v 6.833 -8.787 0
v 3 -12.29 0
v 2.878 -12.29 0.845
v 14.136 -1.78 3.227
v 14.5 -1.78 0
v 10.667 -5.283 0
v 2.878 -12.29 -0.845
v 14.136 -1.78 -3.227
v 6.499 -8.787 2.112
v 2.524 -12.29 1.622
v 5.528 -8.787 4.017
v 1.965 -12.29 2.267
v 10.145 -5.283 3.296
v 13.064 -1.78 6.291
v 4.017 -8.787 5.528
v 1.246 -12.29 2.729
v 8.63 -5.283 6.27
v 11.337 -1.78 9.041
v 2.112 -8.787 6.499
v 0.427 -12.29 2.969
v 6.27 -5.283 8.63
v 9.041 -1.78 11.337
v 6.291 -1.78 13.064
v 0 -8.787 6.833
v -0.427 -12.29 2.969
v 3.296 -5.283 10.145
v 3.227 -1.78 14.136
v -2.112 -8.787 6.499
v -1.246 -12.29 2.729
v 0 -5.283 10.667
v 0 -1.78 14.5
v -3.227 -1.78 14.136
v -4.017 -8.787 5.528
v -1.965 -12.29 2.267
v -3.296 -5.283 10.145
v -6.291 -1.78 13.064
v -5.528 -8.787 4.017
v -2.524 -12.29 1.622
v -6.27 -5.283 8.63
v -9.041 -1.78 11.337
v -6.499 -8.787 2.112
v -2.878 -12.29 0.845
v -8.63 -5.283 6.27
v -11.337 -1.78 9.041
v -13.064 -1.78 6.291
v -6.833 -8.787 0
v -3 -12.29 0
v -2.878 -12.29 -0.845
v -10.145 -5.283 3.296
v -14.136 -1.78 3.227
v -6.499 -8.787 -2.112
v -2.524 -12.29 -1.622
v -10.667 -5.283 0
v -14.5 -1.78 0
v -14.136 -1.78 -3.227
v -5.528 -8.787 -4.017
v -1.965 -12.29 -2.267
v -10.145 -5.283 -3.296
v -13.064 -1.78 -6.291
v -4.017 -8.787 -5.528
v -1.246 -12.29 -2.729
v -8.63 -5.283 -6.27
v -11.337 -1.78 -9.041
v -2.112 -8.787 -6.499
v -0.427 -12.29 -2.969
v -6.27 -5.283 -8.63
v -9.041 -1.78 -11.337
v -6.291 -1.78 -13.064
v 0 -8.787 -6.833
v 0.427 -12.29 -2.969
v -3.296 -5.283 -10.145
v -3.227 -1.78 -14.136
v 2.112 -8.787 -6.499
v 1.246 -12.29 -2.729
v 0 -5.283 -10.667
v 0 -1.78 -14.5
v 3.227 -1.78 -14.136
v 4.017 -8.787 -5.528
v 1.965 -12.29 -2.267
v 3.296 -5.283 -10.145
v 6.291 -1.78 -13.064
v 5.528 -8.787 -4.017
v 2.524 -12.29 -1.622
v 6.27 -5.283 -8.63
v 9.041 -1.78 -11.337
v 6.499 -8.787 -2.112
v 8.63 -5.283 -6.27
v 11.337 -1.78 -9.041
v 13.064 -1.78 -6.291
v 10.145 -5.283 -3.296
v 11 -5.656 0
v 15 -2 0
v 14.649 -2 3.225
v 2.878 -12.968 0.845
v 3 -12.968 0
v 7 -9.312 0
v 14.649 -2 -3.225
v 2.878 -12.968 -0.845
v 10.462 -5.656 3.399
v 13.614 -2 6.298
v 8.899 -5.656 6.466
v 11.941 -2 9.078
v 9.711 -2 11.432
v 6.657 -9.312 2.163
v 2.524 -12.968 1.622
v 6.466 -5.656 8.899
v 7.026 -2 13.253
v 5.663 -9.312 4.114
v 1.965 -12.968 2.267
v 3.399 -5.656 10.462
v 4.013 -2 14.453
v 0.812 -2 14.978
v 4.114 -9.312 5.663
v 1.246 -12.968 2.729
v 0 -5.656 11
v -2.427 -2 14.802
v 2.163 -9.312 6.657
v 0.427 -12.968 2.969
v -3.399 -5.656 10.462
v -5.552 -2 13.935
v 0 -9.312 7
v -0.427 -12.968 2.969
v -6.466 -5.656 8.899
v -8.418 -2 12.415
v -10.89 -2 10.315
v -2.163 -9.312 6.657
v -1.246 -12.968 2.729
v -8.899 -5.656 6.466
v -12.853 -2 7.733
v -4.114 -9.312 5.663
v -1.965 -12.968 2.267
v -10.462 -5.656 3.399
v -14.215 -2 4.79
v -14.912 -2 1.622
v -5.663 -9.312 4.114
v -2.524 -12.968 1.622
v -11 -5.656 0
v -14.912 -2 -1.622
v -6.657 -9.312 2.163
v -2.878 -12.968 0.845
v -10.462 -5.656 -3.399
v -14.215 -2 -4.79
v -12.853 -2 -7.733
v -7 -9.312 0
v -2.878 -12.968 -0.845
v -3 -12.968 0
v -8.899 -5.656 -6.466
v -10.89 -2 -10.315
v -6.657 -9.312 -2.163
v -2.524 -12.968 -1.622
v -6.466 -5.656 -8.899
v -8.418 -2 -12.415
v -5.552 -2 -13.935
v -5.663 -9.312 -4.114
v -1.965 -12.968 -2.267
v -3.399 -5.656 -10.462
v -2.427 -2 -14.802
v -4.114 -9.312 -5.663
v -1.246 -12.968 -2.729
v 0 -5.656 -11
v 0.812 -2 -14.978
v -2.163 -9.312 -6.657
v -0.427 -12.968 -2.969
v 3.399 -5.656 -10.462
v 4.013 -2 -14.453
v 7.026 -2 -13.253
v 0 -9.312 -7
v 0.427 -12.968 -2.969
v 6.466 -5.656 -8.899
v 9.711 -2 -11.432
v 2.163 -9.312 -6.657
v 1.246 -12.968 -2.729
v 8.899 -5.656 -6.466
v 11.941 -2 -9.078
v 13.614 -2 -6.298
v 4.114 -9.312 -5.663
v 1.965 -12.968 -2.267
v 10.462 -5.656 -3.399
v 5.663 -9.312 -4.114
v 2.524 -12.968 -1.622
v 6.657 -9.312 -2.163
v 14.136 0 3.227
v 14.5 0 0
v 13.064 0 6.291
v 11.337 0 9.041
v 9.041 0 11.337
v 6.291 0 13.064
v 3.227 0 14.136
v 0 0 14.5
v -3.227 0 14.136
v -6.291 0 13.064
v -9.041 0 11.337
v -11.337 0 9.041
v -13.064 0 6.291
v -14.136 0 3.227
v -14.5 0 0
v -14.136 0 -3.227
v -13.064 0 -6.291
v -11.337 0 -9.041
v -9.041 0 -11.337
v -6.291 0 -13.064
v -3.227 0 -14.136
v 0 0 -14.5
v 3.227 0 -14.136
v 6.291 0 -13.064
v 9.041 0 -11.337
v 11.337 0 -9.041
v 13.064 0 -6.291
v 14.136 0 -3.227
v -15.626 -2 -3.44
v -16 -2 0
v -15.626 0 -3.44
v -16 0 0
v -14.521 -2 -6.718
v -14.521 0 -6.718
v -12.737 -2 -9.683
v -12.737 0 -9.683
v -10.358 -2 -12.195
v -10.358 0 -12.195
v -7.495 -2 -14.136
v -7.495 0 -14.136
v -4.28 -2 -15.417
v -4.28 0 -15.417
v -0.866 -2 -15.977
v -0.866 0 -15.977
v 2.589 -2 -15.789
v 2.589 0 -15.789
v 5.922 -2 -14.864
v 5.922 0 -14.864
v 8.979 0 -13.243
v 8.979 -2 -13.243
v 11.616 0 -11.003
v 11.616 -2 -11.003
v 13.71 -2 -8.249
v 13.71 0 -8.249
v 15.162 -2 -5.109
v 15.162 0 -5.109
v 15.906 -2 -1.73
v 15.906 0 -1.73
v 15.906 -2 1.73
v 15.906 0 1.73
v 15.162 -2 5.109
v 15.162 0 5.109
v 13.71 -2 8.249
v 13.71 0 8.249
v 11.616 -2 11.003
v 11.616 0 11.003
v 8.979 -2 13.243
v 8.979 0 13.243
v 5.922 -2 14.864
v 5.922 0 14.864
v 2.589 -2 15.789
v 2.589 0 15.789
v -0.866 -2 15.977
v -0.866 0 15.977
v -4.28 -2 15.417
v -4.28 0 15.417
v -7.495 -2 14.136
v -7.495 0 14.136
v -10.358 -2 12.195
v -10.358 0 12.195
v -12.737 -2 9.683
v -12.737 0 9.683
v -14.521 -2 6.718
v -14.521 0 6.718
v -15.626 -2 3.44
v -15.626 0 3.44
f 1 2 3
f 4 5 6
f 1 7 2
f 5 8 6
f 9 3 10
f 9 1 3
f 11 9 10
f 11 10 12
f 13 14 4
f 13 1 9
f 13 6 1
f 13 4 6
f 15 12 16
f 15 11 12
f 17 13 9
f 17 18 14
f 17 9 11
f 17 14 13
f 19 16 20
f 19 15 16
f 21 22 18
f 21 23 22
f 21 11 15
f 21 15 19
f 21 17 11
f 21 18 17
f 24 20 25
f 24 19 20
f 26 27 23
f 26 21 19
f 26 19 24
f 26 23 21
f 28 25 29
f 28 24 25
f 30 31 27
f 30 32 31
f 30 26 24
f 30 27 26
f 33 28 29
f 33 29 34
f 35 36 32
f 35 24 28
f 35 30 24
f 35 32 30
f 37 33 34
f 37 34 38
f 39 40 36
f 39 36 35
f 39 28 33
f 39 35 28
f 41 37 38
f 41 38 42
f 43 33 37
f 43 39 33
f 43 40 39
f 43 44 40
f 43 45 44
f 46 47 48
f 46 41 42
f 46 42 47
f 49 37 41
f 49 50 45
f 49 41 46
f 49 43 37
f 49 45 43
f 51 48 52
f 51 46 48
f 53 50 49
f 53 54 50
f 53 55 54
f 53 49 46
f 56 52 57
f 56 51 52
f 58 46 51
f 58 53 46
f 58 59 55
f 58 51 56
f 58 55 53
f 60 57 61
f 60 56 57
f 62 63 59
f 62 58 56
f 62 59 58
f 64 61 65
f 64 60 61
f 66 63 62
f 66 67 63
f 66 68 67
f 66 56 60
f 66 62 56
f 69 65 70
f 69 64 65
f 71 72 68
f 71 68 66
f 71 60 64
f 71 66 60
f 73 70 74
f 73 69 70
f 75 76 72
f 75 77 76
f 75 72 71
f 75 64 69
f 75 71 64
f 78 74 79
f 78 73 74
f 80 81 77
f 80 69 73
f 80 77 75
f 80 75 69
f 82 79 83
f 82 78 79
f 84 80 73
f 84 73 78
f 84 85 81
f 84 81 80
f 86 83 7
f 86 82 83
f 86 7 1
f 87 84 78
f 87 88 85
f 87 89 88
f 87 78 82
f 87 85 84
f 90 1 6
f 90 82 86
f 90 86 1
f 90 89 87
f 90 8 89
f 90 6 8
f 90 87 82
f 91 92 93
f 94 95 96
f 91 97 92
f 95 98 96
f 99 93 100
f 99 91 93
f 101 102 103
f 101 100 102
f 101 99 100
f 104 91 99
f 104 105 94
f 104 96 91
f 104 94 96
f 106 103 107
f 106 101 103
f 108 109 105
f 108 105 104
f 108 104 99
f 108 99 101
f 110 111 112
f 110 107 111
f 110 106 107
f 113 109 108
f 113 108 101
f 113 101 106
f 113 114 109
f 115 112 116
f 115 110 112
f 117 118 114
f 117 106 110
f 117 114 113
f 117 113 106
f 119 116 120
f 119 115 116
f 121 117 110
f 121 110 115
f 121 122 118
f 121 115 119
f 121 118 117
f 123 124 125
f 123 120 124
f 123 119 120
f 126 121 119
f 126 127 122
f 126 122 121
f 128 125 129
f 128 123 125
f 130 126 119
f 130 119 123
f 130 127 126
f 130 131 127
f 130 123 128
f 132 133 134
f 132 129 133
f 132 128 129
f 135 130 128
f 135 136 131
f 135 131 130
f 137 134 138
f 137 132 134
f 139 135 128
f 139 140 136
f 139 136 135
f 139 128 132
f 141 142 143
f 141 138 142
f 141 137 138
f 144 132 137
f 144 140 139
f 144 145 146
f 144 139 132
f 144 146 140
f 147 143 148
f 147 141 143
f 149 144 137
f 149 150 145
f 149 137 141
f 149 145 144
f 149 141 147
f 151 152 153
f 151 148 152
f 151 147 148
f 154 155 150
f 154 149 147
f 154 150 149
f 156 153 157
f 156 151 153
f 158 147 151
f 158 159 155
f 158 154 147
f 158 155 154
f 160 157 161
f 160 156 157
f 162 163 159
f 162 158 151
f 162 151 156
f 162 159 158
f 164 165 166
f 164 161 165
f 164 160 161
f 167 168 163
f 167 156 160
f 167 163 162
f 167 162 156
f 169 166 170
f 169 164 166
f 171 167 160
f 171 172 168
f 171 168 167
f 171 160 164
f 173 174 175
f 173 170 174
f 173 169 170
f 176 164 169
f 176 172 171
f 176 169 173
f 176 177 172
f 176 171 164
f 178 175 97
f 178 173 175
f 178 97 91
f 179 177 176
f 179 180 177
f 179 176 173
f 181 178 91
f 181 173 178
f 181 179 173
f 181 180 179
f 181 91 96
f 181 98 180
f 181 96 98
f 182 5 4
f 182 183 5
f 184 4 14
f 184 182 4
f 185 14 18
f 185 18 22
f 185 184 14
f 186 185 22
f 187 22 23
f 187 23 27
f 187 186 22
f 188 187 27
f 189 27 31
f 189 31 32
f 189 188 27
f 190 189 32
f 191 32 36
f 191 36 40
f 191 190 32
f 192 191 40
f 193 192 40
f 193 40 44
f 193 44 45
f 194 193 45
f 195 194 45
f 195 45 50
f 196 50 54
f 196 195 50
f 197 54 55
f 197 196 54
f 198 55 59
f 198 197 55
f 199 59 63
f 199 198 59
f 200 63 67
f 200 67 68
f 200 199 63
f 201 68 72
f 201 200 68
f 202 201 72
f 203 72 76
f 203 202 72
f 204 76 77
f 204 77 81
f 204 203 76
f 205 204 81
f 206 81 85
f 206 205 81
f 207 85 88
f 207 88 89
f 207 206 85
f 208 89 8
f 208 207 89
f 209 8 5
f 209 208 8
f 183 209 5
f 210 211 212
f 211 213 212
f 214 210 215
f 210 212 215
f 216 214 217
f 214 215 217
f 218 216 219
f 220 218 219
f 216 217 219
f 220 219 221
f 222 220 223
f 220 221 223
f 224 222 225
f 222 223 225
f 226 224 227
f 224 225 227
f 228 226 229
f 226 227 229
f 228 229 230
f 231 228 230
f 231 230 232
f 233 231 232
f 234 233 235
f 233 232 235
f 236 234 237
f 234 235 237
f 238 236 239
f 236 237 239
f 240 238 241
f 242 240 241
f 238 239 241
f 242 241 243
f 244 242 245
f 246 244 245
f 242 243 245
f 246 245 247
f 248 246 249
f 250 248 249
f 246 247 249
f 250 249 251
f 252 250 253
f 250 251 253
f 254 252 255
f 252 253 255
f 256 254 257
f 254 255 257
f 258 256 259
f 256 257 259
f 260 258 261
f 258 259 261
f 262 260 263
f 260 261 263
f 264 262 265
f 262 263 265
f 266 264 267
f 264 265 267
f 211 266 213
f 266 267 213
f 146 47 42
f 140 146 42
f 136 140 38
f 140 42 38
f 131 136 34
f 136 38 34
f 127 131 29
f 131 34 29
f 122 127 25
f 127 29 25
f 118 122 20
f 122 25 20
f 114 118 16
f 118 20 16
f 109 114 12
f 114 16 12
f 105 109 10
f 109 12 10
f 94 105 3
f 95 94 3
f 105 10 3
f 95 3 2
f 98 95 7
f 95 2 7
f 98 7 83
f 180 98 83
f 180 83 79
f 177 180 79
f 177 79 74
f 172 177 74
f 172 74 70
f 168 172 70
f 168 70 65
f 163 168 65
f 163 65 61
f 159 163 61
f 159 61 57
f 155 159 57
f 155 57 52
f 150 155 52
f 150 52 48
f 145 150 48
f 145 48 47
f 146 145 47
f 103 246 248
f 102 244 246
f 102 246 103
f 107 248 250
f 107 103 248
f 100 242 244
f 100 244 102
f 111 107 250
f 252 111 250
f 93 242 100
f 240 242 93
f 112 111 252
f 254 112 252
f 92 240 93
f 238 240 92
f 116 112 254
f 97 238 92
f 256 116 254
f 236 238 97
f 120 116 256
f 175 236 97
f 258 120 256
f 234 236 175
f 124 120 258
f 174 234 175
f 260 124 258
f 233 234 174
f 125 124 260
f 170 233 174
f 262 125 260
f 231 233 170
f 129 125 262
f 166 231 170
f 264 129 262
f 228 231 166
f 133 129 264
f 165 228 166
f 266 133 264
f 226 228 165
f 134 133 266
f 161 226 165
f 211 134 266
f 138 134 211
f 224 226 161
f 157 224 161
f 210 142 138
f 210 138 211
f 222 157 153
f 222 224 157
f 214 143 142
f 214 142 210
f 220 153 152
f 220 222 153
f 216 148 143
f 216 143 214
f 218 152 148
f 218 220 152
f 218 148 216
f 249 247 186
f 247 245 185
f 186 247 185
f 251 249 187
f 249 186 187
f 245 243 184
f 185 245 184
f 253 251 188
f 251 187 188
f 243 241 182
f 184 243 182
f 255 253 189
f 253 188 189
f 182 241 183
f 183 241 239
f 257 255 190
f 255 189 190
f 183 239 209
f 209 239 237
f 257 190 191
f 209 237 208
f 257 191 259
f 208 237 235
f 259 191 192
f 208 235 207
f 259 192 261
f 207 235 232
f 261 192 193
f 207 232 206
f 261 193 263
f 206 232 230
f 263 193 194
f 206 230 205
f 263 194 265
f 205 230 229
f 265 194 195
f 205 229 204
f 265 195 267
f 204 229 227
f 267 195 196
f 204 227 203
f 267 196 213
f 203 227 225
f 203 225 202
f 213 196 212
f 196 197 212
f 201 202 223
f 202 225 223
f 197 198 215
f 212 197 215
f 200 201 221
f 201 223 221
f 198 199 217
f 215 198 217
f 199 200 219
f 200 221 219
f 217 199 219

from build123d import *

# Parameters (mm, degrees)
SKETCH2_W          = 1
SKETCH2_H          = 2
SKETCH3_R          = 3
CUT_EXTRUDE1_DEPTH = 16


with BuildPart() as part:
    # Sketch1 → Revolve-Thin1 (revolve)
    with BuildSketch(Plane.XY):
        with BuildLine():
            Line((15, 0), (15, -2))
            Line((15, -2), (1.349281284, -14.47629266))
            ThreePointArc((1.349281284, -14.47629266), (0.723676268, -14.864481874), (0, -15))
            Line((0, -15), (0, -14.5))
            ThreePointArc((0, -14.5), (0.542757201, -14.398361406), (1.011960963, -14.107219495))
            Line((1.011960963, -14.107219495), (14.5, -1.779610529))
            Line((14.5, -1.779610529), (14.5, 0))
            Line((14.5, 0), (15, 0))
        make_face()
    revolve(axis=Axis((0, 0, 0), (0, -1, 0)))

    # Sketch2 → Revolve1 (revolve)
    with BuildSketch(Plane.XY):
        with Locations((-15.5, -1)):
            Rectangle(SKETCH2_W, SKETCH2_H)
    revolve(axis=Axis((0, 0, 0), (0, -1, 0)))

    # Sketch3 → Cut-Extrude1 (cut, through all)
    with BuildSketch(Plane(origin=(0, 0, 0), x_dir=(-1, 0, 0), z_dir=(0, 1, 0))):
        Circle(SKETCH3_R)
    extrude(amount=-CUT_EXTRUDE1_DEPTH, mode=Mode.SUBTRACT)


solid = part.part
